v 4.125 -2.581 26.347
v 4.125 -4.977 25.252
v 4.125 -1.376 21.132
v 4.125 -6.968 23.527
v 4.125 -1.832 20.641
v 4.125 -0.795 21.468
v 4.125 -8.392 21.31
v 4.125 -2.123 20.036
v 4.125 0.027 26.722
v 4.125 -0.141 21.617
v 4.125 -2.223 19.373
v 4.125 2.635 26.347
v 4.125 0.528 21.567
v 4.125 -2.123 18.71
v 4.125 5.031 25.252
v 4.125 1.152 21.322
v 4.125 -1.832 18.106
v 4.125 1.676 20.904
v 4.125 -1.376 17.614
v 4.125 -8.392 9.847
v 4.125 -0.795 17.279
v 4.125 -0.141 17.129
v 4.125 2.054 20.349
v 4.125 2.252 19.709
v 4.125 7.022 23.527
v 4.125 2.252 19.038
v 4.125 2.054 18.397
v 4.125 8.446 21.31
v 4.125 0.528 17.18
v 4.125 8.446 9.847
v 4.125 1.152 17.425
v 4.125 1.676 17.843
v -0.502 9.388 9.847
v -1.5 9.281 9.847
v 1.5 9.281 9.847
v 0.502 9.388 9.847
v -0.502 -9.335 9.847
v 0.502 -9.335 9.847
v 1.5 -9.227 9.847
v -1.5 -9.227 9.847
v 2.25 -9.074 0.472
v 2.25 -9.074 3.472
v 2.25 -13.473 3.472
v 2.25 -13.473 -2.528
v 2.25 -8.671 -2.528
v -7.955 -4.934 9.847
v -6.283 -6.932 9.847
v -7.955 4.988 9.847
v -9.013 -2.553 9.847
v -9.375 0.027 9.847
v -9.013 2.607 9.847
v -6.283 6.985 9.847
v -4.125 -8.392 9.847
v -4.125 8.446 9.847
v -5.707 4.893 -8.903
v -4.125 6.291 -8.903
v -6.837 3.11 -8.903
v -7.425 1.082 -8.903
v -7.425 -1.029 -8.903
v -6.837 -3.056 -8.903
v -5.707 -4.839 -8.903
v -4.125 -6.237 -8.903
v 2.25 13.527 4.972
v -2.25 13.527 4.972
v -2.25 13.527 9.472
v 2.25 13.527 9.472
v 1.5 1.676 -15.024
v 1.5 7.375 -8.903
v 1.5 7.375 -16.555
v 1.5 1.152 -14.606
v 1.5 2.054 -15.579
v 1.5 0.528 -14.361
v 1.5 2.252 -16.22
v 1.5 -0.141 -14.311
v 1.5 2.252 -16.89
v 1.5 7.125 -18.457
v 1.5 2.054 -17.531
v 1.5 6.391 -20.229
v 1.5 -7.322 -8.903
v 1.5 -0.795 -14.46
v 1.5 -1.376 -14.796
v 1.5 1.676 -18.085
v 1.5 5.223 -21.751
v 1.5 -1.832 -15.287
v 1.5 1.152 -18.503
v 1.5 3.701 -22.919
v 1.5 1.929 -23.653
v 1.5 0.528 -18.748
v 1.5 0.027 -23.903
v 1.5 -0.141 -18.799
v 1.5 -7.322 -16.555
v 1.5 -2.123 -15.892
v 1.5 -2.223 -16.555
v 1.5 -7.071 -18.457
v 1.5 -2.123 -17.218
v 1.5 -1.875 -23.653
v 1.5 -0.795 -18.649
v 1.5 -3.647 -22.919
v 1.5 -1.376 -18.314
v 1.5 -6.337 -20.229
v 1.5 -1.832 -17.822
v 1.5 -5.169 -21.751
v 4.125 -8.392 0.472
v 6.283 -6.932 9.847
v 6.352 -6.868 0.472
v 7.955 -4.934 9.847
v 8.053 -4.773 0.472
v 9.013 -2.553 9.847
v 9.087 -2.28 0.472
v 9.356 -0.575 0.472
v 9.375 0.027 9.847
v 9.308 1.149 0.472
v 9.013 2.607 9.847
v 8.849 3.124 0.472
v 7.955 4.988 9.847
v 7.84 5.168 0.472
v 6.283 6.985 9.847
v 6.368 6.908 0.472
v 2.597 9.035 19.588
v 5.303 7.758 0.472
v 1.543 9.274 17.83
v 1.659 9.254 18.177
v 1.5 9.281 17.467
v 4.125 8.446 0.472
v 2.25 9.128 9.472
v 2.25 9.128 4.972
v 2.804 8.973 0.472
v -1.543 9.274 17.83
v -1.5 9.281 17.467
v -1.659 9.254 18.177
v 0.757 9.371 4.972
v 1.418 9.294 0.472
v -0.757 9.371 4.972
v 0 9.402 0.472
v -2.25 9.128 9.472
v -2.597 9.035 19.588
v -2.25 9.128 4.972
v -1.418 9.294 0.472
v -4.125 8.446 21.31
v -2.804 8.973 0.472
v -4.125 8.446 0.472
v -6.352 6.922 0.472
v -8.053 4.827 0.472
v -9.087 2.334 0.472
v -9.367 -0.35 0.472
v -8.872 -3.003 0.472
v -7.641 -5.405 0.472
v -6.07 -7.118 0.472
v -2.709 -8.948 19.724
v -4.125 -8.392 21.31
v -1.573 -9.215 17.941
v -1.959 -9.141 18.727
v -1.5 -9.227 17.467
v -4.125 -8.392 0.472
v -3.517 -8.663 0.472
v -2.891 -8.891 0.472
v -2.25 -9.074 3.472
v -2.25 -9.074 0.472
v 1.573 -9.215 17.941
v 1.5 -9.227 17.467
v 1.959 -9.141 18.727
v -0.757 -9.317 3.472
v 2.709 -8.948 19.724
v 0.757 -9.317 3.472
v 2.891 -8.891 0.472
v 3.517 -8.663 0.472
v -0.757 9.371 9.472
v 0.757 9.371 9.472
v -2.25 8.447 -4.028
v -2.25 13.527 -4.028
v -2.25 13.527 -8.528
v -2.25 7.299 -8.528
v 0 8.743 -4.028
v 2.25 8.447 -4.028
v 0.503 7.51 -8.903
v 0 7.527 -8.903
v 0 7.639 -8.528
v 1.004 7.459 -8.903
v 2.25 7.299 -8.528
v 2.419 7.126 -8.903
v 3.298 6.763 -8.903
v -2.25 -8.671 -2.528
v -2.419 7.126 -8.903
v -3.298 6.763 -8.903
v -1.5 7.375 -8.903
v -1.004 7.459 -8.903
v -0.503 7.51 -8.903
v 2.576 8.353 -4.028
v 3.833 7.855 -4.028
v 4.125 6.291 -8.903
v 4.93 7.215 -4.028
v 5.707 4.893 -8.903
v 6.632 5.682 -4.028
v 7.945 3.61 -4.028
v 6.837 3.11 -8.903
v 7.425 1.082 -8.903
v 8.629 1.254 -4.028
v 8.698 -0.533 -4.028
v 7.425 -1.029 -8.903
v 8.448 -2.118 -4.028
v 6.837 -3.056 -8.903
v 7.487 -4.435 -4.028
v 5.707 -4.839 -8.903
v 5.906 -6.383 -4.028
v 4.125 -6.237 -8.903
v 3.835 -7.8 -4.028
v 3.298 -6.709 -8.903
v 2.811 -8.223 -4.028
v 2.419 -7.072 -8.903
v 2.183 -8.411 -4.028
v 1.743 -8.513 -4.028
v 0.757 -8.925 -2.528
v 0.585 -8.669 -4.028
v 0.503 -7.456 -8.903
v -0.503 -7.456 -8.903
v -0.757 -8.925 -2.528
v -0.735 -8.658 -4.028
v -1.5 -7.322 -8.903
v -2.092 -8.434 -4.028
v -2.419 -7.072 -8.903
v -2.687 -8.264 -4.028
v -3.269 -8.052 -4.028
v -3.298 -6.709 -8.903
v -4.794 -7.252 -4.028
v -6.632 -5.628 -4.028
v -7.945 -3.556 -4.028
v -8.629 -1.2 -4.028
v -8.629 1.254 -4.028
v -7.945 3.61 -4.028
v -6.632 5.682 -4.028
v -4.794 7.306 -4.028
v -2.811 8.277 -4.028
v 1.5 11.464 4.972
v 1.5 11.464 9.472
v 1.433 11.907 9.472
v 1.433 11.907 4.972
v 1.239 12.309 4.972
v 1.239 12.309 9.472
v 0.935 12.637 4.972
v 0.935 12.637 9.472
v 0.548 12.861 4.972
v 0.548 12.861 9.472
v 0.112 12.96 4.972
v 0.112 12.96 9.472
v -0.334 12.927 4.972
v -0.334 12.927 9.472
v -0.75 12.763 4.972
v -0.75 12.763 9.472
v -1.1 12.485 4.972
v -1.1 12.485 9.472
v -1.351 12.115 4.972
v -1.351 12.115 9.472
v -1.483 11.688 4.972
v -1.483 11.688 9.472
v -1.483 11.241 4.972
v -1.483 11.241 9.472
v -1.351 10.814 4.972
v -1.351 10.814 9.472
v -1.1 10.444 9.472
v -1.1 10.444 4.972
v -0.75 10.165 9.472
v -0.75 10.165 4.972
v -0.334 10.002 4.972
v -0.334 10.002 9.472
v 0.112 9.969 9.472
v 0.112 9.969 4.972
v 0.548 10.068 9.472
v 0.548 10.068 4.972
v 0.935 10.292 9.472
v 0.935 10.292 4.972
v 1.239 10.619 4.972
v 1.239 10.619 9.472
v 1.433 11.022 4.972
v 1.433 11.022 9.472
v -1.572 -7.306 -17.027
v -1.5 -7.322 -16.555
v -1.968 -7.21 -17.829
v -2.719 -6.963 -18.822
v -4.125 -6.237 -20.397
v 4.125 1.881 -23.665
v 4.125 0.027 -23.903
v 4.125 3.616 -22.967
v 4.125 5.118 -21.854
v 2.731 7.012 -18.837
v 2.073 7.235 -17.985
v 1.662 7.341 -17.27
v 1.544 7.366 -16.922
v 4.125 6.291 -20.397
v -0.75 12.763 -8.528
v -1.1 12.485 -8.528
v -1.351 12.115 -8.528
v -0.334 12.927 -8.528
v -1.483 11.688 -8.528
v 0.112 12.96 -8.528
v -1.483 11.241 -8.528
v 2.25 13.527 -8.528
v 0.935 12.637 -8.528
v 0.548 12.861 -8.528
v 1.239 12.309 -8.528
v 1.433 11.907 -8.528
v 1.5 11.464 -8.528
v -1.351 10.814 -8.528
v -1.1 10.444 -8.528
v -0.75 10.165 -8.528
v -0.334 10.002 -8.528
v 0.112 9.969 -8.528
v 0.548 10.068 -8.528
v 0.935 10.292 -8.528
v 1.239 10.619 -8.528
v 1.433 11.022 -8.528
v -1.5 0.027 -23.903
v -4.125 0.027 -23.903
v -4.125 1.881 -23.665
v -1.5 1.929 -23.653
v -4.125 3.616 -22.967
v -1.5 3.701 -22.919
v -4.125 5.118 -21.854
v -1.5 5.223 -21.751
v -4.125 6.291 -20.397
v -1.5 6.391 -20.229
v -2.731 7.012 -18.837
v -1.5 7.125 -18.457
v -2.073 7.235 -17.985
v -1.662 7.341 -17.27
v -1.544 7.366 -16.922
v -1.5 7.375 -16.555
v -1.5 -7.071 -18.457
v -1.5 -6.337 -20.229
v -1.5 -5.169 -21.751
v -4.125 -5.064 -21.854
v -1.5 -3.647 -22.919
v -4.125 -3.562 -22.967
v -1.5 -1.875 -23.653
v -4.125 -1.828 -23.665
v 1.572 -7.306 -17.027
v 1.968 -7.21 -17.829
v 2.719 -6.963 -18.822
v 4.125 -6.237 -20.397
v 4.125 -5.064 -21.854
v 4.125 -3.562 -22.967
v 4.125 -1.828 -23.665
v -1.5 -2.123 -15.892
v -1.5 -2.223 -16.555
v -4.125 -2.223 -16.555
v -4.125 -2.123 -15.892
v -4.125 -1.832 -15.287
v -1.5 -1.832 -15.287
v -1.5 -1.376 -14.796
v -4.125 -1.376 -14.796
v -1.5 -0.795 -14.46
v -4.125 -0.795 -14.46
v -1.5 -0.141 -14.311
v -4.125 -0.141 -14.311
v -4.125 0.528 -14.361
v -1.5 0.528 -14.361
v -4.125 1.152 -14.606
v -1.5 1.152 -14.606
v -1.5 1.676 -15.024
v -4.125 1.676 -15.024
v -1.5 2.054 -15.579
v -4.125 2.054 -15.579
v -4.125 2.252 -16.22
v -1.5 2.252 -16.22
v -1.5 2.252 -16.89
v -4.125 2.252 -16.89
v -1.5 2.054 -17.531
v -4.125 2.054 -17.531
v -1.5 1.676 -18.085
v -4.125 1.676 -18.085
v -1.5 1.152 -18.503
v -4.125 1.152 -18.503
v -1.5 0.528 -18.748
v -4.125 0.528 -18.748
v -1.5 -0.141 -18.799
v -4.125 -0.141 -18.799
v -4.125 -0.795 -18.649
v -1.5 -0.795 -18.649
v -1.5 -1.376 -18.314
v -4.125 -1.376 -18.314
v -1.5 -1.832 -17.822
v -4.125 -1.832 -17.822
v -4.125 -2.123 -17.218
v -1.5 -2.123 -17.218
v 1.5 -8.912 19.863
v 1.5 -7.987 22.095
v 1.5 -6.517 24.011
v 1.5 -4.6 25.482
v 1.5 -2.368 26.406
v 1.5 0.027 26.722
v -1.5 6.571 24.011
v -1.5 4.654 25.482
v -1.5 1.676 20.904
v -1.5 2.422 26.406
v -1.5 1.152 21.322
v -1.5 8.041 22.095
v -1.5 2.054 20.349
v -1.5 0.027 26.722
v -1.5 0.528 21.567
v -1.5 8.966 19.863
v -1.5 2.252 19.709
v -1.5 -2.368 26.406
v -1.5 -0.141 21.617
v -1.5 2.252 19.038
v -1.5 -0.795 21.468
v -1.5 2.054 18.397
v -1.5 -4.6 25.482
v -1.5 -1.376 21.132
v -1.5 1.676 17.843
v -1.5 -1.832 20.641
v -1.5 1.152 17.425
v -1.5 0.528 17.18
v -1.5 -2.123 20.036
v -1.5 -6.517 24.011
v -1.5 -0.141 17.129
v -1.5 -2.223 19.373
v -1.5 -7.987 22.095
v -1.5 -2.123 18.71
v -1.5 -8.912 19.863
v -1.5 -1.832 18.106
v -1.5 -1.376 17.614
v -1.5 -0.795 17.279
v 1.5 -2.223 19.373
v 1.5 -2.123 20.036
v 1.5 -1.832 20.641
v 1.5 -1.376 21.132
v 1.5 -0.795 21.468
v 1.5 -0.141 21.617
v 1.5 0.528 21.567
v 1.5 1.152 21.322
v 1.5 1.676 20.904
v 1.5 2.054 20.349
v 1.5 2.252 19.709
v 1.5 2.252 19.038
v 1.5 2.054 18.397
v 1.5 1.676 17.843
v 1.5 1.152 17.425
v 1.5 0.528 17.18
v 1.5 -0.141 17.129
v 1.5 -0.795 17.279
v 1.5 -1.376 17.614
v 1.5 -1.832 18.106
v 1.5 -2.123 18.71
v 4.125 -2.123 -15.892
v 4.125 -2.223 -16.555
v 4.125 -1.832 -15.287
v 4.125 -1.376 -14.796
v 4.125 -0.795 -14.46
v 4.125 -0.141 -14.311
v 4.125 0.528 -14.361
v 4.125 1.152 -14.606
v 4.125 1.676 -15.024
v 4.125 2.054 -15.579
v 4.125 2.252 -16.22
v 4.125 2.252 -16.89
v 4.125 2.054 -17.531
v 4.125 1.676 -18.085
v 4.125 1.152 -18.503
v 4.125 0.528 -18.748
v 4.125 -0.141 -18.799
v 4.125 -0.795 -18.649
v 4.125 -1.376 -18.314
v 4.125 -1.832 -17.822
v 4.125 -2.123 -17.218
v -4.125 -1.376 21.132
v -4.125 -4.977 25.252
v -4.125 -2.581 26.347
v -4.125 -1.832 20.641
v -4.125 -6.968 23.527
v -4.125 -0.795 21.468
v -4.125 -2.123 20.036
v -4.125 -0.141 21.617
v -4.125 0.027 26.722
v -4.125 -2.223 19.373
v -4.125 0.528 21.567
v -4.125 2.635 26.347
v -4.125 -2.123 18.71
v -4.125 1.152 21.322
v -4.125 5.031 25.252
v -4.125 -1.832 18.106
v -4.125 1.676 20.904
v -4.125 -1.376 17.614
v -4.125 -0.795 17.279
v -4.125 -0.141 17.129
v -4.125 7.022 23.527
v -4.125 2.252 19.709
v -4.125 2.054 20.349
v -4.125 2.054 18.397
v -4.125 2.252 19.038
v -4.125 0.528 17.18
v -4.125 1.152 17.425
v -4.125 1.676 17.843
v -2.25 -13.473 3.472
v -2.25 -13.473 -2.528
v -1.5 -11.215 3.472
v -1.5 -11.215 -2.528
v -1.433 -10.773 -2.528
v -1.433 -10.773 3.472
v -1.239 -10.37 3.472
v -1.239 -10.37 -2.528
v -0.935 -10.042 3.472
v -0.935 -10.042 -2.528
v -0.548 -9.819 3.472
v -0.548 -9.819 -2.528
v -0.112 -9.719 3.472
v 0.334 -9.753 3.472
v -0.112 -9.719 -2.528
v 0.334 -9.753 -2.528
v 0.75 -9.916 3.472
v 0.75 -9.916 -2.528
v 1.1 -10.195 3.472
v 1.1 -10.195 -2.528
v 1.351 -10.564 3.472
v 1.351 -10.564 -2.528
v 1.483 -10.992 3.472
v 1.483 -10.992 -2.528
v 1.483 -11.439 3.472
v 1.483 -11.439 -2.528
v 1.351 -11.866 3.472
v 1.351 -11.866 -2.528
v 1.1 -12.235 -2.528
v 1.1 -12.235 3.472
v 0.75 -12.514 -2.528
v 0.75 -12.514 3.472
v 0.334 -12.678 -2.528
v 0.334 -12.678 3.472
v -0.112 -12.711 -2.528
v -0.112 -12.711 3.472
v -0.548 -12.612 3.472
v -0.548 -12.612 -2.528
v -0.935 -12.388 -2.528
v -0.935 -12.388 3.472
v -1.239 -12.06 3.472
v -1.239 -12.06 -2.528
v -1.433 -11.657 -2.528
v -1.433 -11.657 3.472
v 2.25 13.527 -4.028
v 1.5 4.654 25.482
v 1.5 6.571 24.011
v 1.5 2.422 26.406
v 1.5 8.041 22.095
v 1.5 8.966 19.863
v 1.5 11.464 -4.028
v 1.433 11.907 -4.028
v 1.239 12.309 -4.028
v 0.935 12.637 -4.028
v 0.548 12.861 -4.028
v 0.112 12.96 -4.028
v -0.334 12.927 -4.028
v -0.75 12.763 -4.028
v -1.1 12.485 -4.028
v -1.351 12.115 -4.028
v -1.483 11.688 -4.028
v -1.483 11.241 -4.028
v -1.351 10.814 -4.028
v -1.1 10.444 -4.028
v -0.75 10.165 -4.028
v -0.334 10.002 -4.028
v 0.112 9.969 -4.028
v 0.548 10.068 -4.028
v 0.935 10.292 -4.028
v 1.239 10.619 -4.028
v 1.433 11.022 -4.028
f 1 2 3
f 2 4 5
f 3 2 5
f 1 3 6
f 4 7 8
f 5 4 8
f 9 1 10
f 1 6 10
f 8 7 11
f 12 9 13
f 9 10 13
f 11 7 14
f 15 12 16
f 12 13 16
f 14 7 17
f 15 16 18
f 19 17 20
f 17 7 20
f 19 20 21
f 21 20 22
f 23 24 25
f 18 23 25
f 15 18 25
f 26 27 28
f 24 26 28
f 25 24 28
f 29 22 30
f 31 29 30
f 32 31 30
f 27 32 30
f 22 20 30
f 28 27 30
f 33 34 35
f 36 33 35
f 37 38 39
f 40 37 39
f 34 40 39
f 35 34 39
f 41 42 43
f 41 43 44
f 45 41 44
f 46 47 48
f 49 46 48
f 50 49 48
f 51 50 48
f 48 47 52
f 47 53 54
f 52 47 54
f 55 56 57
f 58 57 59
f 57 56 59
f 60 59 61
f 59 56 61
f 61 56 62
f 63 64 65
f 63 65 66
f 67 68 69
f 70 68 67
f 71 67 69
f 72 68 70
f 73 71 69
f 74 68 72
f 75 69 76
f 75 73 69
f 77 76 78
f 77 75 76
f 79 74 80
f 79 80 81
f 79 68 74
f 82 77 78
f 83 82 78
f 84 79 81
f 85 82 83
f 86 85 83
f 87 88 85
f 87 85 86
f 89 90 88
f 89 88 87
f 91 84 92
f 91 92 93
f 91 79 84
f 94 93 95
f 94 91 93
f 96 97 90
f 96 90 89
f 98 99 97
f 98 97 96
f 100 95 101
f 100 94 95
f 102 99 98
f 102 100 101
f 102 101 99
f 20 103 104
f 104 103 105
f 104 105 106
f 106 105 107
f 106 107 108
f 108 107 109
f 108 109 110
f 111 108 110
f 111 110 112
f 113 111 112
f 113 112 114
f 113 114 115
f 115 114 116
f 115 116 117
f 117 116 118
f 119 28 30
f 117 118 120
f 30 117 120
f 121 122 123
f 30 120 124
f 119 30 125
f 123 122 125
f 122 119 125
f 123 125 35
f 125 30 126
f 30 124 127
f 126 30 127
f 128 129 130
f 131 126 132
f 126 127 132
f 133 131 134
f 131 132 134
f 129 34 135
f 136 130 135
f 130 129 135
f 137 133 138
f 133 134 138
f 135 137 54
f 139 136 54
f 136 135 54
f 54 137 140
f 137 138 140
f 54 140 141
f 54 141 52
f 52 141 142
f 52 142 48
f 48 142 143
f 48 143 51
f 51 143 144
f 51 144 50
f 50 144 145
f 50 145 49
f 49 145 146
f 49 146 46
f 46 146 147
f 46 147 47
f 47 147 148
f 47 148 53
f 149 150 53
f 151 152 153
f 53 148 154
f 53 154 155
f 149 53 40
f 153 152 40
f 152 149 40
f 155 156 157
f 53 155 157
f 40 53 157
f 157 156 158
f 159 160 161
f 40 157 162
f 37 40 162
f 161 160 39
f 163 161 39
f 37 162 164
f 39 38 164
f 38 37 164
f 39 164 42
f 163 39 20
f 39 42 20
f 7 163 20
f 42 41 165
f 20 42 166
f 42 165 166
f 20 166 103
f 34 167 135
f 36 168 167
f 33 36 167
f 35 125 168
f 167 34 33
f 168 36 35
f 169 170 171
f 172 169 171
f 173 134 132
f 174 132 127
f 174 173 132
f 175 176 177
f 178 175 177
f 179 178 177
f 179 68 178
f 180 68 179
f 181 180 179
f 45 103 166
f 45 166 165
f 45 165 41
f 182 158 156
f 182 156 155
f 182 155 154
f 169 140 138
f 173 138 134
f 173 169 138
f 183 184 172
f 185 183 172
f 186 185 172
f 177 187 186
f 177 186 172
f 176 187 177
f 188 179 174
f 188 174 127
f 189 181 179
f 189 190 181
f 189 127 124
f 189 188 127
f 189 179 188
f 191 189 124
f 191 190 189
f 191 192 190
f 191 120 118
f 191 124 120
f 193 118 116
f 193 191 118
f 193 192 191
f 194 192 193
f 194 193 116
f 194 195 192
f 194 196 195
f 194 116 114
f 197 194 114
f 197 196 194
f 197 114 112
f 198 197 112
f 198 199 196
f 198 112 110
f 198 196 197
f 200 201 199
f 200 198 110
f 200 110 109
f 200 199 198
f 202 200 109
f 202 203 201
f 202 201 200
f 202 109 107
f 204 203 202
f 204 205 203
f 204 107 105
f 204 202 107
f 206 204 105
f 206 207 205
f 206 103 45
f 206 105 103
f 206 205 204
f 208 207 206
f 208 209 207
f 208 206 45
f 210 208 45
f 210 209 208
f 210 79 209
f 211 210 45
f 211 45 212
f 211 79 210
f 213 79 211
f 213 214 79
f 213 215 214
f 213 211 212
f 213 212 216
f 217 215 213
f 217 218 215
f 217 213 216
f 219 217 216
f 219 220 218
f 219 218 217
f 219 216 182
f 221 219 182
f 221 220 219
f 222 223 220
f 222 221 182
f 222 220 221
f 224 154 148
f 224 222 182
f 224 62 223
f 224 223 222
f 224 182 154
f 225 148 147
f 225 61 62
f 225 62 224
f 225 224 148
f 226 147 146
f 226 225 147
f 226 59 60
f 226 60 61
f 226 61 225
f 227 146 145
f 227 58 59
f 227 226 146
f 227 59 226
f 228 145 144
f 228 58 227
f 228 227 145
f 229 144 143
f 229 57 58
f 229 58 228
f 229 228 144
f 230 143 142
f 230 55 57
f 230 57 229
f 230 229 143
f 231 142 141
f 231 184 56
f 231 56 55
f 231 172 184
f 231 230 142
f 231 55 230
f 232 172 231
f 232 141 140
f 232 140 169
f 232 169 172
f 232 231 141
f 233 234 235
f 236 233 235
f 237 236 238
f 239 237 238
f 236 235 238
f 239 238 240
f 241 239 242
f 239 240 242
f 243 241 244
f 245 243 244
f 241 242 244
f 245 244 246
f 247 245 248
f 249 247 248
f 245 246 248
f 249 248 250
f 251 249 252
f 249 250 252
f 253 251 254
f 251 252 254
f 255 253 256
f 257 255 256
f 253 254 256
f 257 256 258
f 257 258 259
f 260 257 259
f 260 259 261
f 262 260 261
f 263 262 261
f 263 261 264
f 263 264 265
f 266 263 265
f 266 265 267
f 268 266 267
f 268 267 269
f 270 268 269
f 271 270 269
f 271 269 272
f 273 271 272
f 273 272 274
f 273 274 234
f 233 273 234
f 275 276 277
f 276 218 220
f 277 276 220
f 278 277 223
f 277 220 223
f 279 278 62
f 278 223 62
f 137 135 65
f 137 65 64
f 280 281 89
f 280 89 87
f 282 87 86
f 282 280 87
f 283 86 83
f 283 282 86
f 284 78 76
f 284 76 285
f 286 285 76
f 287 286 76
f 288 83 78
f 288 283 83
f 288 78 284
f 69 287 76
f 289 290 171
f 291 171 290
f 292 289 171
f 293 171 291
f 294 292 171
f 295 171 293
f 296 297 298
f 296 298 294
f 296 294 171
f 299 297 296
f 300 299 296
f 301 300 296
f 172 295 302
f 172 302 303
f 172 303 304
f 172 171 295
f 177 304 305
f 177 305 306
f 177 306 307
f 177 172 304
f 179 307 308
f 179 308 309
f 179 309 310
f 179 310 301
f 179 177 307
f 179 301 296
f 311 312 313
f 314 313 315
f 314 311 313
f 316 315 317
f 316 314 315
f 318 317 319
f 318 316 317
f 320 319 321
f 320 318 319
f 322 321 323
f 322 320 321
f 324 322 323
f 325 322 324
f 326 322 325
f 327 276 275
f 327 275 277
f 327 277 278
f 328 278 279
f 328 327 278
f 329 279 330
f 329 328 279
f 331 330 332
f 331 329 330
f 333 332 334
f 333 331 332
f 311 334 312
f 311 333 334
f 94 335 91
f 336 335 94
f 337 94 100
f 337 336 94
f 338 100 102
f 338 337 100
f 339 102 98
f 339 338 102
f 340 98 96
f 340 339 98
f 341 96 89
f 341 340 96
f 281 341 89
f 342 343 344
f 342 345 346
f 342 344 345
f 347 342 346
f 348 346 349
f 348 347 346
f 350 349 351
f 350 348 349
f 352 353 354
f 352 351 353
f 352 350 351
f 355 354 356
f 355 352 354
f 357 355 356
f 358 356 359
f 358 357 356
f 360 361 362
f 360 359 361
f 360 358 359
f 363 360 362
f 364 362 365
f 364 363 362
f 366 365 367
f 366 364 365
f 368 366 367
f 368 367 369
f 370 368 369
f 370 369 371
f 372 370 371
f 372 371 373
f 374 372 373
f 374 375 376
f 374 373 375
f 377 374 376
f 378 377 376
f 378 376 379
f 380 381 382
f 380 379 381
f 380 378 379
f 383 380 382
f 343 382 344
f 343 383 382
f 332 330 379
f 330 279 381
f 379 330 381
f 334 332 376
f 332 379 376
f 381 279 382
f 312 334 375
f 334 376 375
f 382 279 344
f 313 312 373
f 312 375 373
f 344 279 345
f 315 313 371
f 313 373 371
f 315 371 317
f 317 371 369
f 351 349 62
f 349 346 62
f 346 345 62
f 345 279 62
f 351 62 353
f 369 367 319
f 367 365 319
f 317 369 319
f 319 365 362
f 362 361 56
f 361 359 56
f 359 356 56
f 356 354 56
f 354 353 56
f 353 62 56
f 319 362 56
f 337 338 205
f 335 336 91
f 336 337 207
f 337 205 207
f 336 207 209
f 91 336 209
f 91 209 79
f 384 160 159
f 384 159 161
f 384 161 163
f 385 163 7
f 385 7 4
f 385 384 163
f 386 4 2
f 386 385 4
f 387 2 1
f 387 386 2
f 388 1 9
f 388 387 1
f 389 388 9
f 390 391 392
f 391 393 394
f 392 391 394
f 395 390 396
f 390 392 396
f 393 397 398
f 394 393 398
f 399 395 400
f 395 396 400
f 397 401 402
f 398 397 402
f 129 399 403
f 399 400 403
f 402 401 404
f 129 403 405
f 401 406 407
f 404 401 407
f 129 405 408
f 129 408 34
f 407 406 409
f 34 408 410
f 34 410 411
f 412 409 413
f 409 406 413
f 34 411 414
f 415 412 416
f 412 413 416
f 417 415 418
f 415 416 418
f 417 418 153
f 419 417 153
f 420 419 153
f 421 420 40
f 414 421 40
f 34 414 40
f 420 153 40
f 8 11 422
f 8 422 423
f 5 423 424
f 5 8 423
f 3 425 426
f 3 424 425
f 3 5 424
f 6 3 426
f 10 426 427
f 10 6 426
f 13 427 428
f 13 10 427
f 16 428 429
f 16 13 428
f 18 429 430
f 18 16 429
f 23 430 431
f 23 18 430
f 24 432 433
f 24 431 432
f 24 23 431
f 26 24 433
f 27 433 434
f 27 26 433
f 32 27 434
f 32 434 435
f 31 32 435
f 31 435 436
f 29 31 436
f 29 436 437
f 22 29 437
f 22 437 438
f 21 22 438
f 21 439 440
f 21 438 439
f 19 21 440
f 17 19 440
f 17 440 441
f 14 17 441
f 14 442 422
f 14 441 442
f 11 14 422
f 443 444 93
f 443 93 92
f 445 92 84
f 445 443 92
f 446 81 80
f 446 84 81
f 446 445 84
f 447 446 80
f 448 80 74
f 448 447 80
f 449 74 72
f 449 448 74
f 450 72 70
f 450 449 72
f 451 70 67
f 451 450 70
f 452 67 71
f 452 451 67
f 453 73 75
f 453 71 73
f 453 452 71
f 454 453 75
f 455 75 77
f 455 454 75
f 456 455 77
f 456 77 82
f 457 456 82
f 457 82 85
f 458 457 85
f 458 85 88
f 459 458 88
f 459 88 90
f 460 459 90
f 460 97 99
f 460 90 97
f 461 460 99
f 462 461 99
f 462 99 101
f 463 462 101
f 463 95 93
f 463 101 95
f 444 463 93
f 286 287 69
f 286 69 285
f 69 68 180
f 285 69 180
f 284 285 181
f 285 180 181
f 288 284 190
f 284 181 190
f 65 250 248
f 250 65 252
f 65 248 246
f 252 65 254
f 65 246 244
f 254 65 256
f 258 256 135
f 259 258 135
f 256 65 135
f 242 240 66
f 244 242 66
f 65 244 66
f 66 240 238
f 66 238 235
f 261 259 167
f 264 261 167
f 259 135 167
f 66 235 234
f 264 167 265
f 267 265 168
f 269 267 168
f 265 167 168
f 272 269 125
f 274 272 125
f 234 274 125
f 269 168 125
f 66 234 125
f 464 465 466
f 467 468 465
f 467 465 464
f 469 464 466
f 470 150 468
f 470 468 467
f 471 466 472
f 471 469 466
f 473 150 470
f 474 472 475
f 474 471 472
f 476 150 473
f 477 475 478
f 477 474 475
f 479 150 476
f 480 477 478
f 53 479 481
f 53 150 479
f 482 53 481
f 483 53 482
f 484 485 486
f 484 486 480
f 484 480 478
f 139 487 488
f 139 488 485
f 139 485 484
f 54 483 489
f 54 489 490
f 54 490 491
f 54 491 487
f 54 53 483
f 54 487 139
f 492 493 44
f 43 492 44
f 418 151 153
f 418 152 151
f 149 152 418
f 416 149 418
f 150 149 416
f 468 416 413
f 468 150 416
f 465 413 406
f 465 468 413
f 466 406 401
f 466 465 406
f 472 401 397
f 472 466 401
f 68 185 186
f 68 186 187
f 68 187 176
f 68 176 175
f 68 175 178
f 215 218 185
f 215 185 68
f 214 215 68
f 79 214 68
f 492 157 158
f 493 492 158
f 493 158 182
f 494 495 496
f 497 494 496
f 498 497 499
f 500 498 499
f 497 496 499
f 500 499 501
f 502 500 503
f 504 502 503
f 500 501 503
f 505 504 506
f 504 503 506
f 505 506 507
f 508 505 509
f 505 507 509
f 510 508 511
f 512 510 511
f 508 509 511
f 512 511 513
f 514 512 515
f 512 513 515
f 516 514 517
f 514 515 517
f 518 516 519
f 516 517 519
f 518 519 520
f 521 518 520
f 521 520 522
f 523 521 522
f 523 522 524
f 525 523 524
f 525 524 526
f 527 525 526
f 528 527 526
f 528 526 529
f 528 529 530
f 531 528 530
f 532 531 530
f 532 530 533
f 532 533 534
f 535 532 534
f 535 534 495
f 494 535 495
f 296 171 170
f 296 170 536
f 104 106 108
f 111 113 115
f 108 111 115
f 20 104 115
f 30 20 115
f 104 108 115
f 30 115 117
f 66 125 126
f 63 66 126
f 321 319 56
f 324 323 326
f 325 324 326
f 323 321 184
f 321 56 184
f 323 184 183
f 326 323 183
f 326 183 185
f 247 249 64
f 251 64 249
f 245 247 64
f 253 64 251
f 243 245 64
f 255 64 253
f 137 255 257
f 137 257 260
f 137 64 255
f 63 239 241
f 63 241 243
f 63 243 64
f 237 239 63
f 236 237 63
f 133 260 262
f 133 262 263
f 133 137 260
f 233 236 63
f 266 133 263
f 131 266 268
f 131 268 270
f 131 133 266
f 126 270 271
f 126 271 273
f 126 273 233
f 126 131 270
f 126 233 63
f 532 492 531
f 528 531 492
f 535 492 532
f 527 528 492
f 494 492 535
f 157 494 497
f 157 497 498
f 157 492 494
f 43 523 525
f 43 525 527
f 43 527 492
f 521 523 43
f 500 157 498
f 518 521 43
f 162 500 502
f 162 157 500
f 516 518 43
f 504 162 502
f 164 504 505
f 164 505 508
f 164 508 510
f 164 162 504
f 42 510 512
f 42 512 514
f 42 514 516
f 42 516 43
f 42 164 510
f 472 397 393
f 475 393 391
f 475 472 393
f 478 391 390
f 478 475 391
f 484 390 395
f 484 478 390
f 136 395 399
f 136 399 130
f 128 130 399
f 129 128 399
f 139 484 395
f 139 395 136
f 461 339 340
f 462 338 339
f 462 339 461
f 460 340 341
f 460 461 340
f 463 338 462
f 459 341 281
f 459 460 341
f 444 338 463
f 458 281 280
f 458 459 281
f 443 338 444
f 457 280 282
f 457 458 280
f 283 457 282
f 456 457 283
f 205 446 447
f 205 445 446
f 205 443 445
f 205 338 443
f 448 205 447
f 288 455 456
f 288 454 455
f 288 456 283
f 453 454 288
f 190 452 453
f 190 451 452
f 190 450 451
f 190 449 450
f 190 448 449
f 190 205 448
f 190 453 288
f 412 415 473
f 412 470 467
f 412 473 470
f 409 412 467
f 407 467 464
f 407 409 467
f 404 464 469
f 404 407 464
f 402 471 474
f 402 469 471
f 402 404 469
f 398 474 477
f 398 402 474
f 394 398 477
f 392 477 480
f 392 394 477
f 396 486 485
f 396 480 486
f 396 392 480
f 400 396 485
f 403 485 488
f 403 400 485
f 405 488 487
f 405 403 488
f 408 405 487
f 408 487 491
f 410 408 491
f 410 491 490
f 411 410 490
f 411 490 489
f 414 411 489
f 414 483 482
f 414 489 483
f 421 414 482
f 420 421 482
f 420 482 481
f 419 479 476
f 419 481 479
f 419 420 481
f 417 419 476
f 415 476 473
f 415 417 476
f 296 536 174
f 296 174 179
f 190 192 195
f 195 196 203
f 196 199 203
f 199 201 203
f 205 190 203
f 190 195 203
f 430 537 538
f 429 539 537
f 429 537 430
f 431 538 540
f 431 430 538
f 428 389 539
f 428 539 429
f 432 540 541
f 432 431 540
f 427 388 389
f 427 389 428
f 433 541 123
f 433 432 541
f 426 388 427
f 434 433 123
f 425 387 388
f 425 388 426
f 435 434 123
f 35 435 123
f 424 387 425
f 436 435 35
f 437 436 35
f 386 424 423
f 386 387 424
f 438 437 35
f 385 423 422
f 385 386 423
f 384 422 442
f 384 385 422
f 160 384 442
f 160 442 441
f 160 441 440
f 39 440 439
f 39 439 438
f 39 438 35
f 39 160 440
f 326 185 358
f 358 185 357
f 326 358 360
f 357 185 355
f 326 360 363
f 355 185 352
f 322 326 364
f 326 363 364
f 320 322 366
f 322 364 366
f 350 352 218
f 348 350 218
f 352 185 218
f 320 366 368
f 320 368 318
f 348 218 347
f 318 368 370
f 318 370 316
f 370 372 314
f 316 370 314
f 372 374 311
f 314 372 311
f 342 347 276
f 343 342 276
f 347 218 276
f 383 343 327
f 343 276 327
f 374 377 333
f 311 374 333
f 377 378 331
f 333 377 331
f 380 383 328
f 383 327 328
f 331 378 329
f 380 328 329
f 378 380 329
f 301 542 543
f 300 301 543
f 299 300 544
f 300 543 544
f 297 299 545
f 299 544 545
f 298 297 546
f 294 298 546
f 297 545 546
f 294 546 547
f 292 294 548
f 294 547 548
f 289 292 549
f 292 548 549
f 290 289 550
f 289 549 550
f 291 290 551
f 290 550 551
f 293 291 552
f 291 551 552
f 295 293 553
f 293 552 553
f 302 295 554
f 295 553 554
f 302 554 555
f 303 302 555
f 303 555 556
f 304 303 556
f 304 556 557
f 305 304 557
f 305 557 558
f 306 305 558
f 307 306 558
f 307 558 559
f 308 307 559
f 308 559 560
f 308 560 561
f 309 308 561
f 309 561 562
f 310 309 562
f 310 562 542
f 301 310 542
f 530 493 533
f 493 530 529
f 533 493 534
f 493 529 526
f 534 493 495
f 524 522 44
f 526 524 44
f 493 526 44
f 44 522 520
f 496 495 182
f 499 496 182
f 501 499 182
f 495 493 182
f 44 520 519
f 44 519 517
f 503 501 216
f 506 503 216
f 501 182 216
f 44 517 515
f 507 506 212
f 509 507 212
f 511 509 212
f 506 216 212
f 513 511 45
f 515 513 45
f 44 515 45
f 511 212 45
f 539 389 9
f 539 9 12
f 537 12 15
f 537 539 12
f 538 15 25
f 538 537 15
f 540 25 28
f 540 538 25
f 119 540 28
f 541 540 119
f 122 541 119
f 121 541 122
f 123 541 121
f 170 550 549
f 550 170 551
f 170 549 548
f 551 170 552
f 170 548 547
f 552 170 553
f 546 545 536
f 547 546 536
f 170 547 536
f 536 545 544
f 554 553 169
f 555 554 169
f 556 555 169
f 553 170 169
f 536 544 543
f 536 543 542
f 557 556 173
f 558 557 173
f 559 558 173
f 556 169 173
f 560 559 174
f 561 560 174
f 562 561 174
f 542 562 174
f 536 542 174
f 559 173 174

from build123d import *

# Parameters (mm, degrees)
SKETCH1_W                = 11
SKETCH1_H                = 25
BOSS_EXTRUDE1_DEPTH      = 35
CUT_EXTRUDE9_DEPTH       = 31.868357473
CUT_EXTRUDE9_DEPTH_BACK  = 31.868357473
SKETCH6_R                = 20
SKETCH6_R_2              = 12.5
SKETCH7_W                = 11
SKETCH7_H                = 20
BOSS_EXTRUDE3_DEPTH      = 20
SKETCH8_R                = 15
SKETCH8_R_2              = 10
CUT_EXTRUDE10_DEPTH      = 51.682837382
CUT_EXTRUDE11_DEPTH      = 40.210967919
CUT_EXTRUDE11_DEPTH_BACK = 40.210967919
SKETCH9_W                = 4
SKETCH9_H                = 20
SKETCH9_H_2              = 22.5
CUT_EXTRUDE15_START      = -3.5
CUT_EXTRUDE15_DEPTH      = 11
CUT_EXTRUDE16_DEPTH      = 40.893608668
CUT_EXTRUDE16_DEPTH_BACK = 40.893608668
CUT_EXTRUDE17_DEPTH      = 42.29467294
CUT_EXTRUDE17_DEPTH_BACK = 42.29467294
SKETCH14_R               = 3
SKETCH15_W               = 6
SKETCH15_H               = 8
BOSS_EXTRUDE5_DEPTH      = 18
SKETCH17_R               = 2
CUT_EXTRUDE19_DEPTH      = 45.735332948
SKETCH20_W               = 6
SKETCH20_H               = 6
BOSS_EXTRUDE7_DEPTH      = 18
SKETCH21_R               = 2
CUT_EXTRUDE22_DEPTH      = 50.603427453
SCALE1_SCALE             = 0.75


# Read off the part's stored shape, not the designer's step: Cut-Extrude15
with BuildPart() as part:
    # Sketch1 → Boss-Extrude1 (new body)
    with BuildSketch(Plane.XY):
        Rectangle(SKETCH1_W, SKETCH1_H)
    extrude(amount=BOSS_EXTRUDE1_DEPTH)


with BuildPart() as body_2:
    # Sketch2 → Revolve1 (revolve)
    with BuildSketch(Plane(origin=(0, 0, 0), x_dir=(0, 0, -1), z_dir=(1, 0, 0))):
        with BuildLine():
            Line((-12.5, 0), (12.5, 0))
            Line((12.5, 0), (12.5, 10))
            add(Edge.make_bspline(
                [(-12.5, 12.5), (0.245145169, 13.725725845), (12.5, 10)],
                knots=[0, 0, 0, 1, 1, 1], degree=2))
            Line((-12.5, 12.5), (-12.5, 0))
        make_face()
    revolve(axis=Axis((0, 0, 12.5), (0, 0, -1)))


with BuildPart() as cut_extrude9_tool:
    # Sketch6 → Cut-Extrude9 (new, two sides: drawn at the far end of the back side and taken through both)
    with BuildSketch(Plane.XY.offset(12.5).offset(-CUT_EXTRUDE9_DEPTH_BACK)):
        Circle(SKETCH6_R)
        with Locations(Location((0, 0, 0), (0, 0, 270))):
            Circle(SKETCH6_R_2, mode=Mode.SUBTRACT)
    extrude(amount=CUT_EXTRUDE9_DEPTH + CUT_EXTRUDE9_DEPTH_BACK)


with BuildPart() as part_1:
    add(part.part)

    # Cut-Extrude9: cut by cut_extrude9_tool
    add(cut_extrude9_tool.part, mode=Mode.SUBTRACT)


with BuildPart() as body_2_1:
    add(body_2.part)

    # Cut-Extrude9: cut by cut_extrude9_tool
    add(cut_extrude9_tool.part, mode=Mode.SUBTRACT)

    # Sketch7 → Boss-Extrude3 (add)
    with BuildSketch(Plane(origin=(0, 0, -12.5), x_dir=(-1, 0, 0), z_dir=(0, 0, -1))):
        Rectangle(SKETCH7_W, SKETCH7_H)
    extrude(amount=BOSS_EXTRUDE3_DEPTH)

    # Sketch8 → Cut-Extrude10 (cut, through all)
    with BuildSketch(Plane(origin=(0, 0, -12.5), x_dir=(-1, 0, 0), z_dir=(0, 0, -1))):
        Circle(SKETCH8_R)
        Circle(SKETCH8_R_2, mode=Mode.SUBTRACT)
    extrude(amount=CUT_EXTRUDE10_DEPTH, mode=Mode.SUBTRACT)


with BuildPart() as cut_extrude11_tool:
    # Sketch9 → Cut-Extrude11 (new, two sides: drawn at the far end of the back side and taken through both)
    with BuildSketch(Plane(origin=(0, 0, 0), x_dir=(1, 0, 0), z_dir=(0, 1, 0)).offset(-CUT_EXTRUDE11_DEPTH_BACK)):
        with Locations((0, 22.5)):
            Rectangle(SKETCH9_W, SKETCH9_H)
        with Locations((0, -23.75)):
            Rectangle(SKETCH9_W, SKETCH9_H_2)
    extrude(amount=CUT_EXTRUDE11_DEPTH + CUT_EXTRUDE11_DEPTH_BACK)


with BuildPart() as part_2:
    add(part_1.part)

    # Cut-Extrude11: cut by cut_extrude11_tool
    add(cut_extrude11_tool.part, mode=Mode.SUBTRACT)

    # Cut-Extrude15 outline → Cut-Extrude15 (cut)
    with BuildSketch(Plane(origin=(-2, 0, 0), x_dir=(0, 0, -1), z_dir=(1, 0, 0)).offset(CUT_EXTRUDE15_START)):
        with BuildLine():
            Line((-35, 12.338962679), (-35, -1.7e-08))
            ThreePointArc((-35, -1.7e-08), (-31.38600151, 8.724964177), (-22.661037321, 12.338962679))
            Line((-22.661037321, 12.338962679), (-35, 12.338962679))
        make_face()
        with BuildLine():
            Line((-35, -12.338962679), (-22.661037321, -12.338962679))
            ThreePointArc((-22.661037321, -12.338962679), (-31.386001498, -8.724964189), (-35, -1.7e-08))
            Line((-35, -1.7e-08), (-35, -12.338962679))
        make_face()
    extrude(amount=CUT_EXTRUDE15_DEPTH, mode=Mode.SUBTRACT)


with BuildPart() as body_2_2:
    add(body_2_1.part)

    # Cut-Extrude11: cut by cut_extrude11_tool
    add(cut_extrude11_tool.part, mode=Mode.SUBTRACT)

    # Sketch12 → Cut-Extrude16 (cut, two sides: drawn at the far end of the back side and taken through both)
    with BuildSketch(Plane.ZY.offset(-2).offset(-CUT_EXTRUDE16_DEPTH_BACK)):
        with BuildLine():
            ThreePointArc((-32.5, 0), (-29.630244259, 6.92820323), (-22.702041029, 9.797958971))
            Line((-22.702041029, 9.797958971), (-32.5, 9.797958971))
            Line((-32.5, 9.797958971), (-32.5, 0))
        make_face()
        with BuildLine():
            ThreePointArc((-22.702041029, -9.797958971), (-29.630244259, -6.92820323), (-32.5, 0))
            Line((-32.5, 0), (-32.5, -9.797958971))
            Line((-32.5, -9.797958971), (-22.702041029, -9.797958971))
        make_face()
    extrude(amount=CUT_EXTRUDE16_DEPTH + CUT_EXTRUDE16_DEPTH_BACK, mode=Mode.SUBTRACT)


with BuildPart() as cut_extrude17_tool:
    # Sketch14 → Cut-Extrude17 (new, two sides: drawn at the far end of the back side and taken through both)
    with BuildSketch(Plane.ZY.offset(5.5).offset(-CUT_EXTRUDE17_DEPTH_BACK)):
        with Locations(Location((-22.702041029, 0, 0), (0, 0, 270))):
            Circle(SKETCH14_R)
        with Locations(Location((25.202041029, 0, 0), (0, 0, 270))):
            Circle(SKETCH14_R)
    extrude(amount=CUT_EXTRUDE17_DEPTH + CUT_EXTRUDE17_DEPTH_BACK)


with BuildPart() as part_3:
    add(part_2.part)

    # Cut-Extrude17: cut by cut_extrude17_tool
    add(cut_extrude17_tool.part, mode=Mode.SUBTRACT)



with BuildPart() as body_2_3:
    add(body_2_2.part)

    # Cut-Extrude17: cut by cut_extrude17_tool
    add(cut_extrude17_tool.part, mode=Mode.SUBTRACT)


with BuildPart() as part_4:
    add(part_3.part)

    add(body_2_3.part)  # Boss-Extrude5 merges body 2
    # Sketch15 → Boss-Extrude5 (add)
    with BuildSketch(Plane(origin=(0, 0, 0), x_dir=(1, 0, 0), z_dir=(0, 1, 0))):
        Rectangle(SKETCH15_W, SKETCH15_H)
    extrude(amount=-BOSS_EXTRUDE5_DEPTH)

    # Sketch17 → Cut-Extrude19 (cut, through all)
    with BuildSketch(Plane(origin=(0, 0, -4), x_dir=(-1, 0, 0), z_dir=(0, 0, -1))):
        with Locations((0, -14.989547851)):
            Circle(SKETCH17_R)
    extrude(amount=-CUT_EXTRUDE19_DEPTH, mode=Mode.SUBTRACT)

    # Sketch20 → Boss-Extrude7 (add)
    with BuildSketch(Plane(origin=(0, 0, 0), x_dir=(1, 0, 0), z_dir=(0, 1, 0))):
        with Locations((0, 9)):
            Rectangle(SKETCH20_W, SKETCH20_H)
        with Locations((0, -9)):
            Rectangle(SKETCH20_W, SKETCH20_H)
    extrude(amount=BOSS_EXTRUDE7_DEPTH)

    # Sketch21 → Cut-Extrude22 (cut, through all)
    with BuildSketch(Plane.XY.offset(12)):
        with Locations((0, 15.25)):
            Circle(SKETCH21_R)
    extrude(amount=-CUT_EXTRUDE22_DEPTH, mode=Mode.SUBTRACT)


with BuildPart() as part_5:
    # Scale1: scaled about (2.31e-07, 0.10771387, 1.886694497)
    add(part_4.part.scale(SCALE1_SCALE).moved(Location((5.8e-08, 0.026928468, 0.471673624))))


solid = part_5.part
